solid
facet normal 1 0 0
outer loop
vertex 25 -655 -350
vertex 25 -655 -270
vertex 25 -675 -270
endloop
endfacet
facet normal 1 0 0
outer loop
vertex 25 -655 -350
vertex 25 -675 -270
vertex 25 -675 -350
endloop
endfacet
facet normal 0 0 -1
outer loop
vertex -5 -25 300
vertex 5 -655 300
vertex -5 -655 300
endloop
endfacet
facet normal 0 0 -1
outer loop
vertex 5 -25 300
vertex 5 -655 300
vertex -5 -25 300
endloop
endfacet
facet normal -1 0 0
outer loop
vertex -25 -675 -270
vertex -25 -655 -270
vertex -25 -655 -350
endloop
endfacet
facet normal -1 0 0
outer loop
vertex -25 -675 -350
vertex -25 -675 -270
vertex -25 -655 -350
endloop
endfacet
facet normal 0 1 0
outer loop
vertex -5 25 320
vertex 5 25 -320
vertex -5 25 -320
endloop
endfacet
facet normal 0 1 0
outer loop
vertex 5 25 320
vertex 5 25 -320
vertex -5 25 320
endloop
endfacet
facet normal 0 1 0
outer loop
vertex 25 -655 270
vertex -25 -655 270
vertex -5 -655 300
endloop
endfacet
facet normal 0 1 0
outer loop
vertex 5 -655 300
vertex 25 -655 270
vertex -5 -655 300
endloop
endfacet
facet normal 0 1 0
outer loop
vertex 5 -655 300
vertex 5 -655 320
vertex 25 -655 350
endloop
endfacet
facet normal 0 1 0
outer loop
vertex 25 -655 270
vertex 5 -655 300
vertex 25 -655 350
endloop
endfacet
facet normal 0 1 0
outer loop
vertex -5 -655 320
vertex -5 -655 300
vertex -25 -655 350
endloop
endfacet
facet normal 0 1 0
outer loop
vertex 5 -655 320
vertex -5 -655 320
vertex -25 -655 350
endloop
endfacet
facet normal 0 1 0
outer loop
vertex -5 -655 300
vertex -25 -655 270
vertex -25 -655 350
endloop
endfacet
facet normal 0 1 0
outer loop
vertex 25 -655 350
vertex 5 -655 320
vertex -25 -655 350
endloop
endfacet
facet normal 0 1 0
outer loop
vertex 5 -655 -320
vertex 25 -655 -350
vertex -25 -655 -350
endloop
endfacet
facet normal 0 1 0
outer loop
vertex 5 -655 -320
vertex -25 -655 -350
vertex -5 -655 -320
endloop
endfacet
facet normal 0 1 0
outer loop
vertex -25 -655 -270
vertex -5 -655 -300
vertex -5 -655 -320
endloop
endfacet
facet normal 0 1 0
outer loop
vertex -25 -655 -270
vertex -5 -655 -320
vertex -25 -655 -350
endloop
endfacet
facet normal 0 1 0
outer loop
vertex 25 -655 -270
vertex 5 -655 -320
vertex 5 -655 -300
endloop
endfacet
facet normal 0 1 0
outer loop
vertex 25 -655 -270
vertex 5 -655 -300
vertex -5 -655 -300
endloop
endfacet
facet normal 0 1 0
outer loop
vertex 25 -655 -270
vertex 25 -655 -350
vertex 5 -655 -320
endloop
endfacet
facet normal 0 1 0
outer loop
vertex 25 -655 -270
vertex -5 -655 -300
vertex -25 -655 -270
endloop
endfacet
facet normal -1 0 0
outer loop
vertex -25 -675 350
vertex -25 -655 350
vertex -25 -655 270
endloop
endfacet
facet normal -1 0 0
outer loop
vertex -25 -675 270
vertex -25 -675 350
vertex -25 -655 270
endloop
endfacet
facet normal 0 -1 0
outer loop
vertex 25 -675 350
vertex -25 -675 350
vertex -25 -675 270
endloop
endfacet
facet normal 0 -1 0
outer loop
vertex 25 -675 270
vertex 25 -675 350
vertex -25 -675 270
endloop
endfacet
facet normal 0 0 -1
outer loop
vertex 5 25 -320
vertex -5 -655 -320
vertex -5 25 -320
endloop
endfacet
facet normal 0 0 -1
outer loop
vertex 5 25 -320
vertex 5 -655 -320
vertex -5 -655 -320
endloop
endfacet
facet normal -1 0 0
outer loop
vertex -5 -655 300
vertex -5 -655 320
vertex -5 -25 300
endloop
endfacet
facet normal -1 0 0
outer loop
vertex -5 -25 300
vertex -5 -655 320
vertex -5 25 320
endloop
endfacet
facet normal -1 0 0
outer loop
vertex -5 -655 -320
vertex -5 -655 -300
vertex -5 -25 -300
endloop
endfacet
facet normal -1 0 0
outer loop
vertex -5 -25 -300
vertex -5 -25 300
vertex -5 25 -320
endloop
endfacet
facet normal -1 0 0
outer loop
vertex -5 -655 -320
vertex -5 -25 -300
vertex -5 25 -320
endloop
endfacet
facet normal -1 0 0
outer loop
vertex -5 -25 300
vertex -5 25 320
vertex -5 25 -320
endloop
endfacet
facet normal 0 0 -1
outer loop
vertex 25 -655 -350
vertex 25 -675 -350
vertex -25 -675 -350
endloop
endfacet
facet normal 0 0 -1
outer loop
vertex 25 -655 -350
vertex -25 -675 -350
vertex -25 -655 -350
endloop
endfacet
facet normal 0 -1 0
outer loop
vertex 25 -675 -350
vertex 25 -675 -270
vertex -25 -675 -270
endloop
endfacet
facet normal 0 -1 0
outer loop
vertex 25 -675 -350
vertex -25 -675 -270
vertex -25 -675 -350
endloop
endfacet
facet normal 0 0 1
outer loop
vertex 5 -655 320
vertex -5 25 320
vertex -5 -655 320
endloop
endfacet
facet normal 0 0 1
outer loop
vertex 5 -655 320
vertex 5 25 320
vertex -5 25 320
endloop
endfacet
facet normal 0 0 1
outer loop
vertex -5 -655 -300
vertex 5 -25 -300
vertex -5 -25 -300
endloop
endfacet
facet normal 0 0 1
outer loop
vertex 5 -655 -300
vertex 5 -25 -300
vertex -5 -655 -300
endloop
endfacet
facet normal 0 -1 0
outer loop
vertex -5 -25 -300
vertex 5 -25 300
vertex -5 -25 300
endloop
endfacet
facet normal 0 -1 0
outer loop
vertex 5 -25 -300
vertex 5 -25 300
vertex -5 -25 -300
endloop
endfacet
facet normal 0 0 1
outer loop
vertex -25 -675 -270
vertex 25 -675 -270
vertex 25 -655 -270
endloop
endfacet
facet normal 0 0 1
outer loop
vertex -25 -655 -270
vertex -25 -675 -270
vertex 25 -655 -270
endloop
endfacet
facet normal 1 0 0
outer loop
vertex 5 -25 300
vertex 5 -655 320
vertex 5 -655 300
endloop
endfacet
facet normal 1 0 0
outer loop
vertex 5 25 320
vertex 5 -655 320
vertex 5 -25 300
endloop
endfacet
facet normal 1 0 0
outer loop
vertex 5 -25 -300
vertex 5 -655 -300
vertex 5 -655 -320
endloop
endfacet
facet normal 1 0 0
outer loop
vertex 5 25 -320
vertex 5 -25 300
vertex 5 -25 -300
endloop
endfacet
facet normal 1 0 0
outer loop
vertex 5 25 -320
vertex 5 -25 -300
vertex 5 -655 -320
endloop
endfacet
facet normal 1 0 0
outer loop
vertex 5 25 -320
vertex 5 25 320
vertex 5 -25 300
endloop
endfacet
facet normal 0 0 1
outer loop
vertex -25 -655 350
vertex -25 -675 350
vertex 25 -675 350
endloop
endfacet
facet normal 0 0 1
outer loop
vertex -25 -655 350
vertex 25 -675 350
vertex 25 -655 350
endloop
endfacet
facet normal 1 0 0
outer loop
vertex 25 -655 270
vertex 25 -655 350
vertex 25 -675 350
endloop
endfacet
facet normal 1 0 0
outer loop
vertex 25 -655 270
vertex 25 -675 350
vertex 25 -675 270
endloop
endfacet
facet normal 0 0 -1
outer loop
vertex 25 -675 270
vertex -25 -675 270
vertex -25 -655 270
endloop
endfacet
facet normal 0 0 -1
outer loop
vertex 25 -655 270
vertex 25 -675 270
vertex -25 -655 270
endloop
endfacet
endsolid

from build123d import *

# Parameters (mm, degrees)
EXTRUDE_1_DEPTH = 5
SKETCH_1_3_W    = 80
SKETCH_1_3_H    = 20
EXTRUDE_2_DEPTH = 25


with BuildPart() as part:
    # 草图1 → 凸台-拉伸1 (new, symmetric)
    with BuildSketch(Plane(origin=(0, 0, 0), x_dir=(0, 0, -1), z_dir=(1, 0, 0))):
        Polygon((320, -655), (320, 25), (-320, 25), (-320, -655), (-350, -655), (-350, -675), (-270, -675), (-270, -655), (-300, -655), (-300, -25), (300, -25), (300, -655), (270, -655), (270, -675), (350, -675), (350, -655), align=None)
    extrude(amount=EXTRUDE_1_DEPTH, both=True)

    # 草图1<3> → 凸台-拉伸2 (add, symmetric)
    with BuildSketch(Plane(origin=(0, 0, 0), x_dir=(0, 0, -1), z_dir=(1, 0, 0))):
        with Locations((310, -665)):
            Rectangle(SKETCH_1_3_W, SKETCH_1_3_H)
        with Locations((-310, -665)):
            Rectangle(SKETCH_1_3_W, SKETCH_1_3_H)
    extrude(amount=EXTRUDE_2_DEPTH, both=True)


solid = part.part
